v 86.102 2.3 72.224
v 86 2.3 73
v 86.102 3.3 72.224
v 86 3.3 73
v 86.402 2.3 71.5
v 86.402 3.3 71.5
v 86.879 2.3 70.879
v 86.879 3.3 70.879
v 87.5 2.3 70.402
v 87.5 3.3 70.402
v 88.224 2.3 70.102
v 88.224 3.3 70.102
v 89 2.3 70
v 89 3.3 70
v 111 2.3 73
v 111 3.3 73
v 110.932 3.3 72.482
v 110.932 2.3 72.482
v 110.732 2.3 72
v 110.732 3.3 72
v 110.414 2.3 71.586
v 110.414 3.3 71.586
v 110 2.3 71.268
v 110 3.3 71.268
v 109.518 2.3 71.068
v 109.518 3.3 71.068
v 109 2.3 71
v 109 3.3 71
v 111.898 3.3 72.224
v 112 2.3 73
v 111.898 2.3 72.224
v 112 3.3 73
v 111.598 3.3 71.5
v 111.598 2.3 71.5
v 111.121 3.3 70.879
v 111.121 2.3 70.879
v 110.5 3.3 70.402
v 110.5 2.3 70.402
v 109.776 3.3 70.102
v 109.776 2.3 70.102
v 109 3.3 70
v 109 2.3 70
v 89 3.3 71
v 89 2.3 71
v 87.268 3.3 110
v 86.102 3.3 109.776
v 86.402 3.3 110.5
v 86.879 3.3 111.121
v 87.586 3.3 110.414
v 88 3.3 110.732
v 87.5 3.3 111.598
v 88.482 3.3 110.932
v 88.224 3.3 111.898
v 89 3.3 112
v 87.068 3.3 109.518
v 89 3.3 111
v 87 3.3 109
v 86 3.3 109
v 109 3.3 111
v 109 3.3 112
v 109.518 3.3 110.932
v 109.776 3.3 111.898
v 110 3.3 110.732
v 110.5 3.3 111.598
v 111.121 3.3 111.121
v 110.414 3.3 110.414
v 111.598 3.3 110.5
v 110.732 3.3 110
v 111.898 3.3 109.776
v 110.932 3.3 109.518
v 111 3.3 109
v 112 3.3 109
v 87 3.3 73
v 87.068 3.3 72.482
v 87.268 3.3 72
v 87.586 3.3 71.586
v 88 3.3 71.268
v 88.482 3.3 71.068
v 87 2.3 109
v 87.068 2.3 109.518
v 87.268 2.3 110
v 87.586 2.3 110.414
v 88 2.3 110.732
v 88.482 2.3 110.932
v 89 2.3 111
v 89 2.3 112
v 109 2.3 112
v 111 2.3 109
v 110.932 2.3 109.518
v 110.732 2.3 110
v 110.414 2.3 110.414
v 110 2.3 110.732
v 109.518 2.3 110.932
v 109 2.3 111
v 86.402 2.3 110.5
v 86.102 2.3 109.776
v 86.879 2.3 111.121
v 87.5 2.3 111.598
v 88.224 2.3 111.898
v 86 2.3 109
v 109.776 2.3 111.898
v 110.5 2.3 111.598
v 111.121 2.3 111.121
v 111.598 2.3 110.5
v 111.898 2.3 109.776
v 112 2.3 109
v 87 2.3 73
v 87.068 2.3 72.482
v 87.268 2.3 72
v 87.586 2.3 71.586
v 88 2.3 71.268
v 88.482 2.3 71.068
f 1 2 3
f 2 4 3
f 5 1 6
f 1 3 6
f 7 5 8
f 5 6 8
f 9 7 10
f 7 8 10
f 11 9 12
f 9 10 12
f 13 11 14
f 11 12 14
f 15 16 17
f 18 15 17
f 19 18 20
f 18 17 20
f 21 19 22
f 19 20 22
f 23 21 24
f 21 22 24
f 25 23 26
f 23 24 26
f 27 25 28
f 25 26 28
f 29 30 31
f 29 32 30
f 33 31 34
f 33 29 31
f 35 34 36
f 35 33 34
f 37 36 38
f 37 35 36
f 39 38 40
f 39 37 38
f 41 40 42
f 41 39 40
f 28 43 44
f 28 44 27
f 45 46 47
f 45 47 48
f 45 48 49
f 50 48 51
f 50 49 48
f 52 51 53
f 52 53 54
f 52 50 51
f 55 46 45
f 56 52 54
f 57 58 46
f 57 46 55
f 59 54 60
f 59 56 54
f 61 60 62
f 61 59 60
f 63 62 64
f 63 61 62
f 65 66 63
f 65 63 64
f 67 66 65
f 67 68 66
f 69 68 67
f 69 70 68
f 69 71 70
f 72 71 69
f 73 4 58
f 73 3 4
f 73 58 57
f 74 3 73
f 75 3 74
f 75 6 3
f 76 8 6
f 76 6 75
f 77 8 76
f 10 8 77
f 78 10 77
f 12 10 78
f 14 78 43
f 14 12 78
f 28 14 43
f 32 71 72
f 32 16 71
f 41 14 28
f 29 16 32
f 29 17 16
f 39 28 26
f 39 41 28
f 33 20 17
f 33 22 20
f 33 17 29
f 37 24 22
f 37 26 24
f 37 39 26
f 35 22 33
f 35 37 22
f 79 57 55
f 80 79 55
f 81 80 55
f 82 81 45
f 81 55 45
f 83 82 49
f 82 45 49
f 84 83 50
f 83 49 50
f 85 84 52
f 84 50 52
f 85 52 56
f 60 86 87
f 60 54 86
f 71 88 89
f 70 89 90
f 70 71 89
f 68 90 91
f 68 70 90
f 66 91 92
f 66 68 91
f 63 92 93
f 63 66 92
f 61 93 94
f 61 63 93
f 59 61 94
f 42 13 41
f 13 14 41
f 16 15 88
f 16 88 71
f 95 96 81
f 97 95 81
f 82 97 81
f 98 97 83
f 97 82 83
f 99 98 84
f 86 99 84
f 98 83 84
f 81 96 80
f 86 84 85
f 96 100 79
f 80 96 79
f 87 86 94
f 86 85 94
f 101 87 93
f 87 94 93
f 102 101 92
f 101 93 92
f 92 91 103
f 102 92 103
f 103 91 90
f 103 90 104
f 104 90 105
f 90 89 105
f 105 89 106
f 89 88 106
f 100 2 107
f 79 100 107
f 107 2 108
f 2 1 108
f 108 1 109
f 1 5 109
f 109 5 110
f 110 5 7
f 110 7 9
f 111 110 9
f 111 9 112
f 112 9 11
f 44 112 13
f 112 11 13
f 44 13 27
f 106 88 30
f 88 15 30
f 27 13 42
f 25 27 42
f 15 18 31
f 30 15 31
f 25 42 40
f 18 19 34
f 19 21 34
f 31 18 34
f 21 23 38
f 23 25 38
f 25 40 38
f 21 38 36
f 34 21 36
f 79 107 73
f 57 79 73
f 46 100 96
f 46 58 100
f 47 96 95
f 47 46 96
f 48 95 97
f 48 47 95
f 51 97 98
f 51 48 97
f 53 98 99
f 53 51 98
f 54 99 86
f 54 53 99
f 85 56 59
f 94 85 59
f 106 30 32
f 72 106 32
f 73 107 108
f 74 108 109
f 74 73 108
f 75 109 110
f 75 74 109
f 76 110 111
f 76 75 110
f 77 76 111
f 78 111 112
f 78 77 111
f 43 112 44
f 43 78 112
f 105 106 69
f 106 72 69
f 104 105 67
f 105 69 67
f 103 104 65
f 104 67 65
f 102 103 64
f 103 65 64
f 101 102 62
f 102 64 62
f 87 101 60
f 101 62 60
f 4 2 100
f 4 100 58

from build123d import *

# Parameters (mm, degrees)
BOX051_W     = 24
BOX051_H     = 5
BOX051_DEPTH = 40
FILLET059_R  = 2
BOX004_W     = 26
BOX004_H     = 1
BOX004_DEPTH = 42
FILLET003_R  = 3


with BuildPart() as fillet059:
    # Box051 → Box051 (new body)
    with BuildSketch(Plane(origin=(90, 4.3, 71), x_dir=(1, 0, 0), z_dir=(0, 0, 1))):
        with Locations((12, 2.5)):
            Rectangle(BOX051_W, BOX051_H)
    extrude(amount=BOX051_DEPTH)

    # Fillet059
    fillet059_edges = [fillet059.edges().sort_by_distance(p)[0] for p in [
        (90, 6.8, 111),
        (90, 6.8, 71),
        (114, 6.8, 111),
        (114, 6.8, 71),
    ]]
    fillet(fillet059_edges, radius=FILLET059_R)


with BuildPart() as fillet059_1:
    # Fillet059 placement: moved
    add(fillet059.part.moved(Location((-3, -2, 0))))


with BuildPart() as cut037:
    # Box004 → Box004 (new body)
    with BuildSketch(Plane(origin=(89, 4.3, 70), x_dir=(1, 0, 0), z_dir=(0, 0, 1))):
        with Locations((13, 0.5)):
            Rectangle(BOX004_W, BOX004_H)
    extrude(amount=BOX004_DEPTH)

    # Fillet003
    fillet003_edges = [cut037.edges().sort_by_distance(p)[0] for p in [
        (89, 4.8, 112),
        (89, 4.8, 70),
        (115, 4.8, 112),
        (115, 4.8, 70),
    ]]
    fillet(fillet003_edges, radius=FILLET003_R)


with BuildPart() as cut037_1:
    # Fillet003 placement: moved
    add(cut037.part.moved(Location((-3, -2, 0))))

    # Cut037: cut Fillet059
    add(fillet059_1.part, mode=Mode.SUBTRACT)


solid = cut037_1.part
